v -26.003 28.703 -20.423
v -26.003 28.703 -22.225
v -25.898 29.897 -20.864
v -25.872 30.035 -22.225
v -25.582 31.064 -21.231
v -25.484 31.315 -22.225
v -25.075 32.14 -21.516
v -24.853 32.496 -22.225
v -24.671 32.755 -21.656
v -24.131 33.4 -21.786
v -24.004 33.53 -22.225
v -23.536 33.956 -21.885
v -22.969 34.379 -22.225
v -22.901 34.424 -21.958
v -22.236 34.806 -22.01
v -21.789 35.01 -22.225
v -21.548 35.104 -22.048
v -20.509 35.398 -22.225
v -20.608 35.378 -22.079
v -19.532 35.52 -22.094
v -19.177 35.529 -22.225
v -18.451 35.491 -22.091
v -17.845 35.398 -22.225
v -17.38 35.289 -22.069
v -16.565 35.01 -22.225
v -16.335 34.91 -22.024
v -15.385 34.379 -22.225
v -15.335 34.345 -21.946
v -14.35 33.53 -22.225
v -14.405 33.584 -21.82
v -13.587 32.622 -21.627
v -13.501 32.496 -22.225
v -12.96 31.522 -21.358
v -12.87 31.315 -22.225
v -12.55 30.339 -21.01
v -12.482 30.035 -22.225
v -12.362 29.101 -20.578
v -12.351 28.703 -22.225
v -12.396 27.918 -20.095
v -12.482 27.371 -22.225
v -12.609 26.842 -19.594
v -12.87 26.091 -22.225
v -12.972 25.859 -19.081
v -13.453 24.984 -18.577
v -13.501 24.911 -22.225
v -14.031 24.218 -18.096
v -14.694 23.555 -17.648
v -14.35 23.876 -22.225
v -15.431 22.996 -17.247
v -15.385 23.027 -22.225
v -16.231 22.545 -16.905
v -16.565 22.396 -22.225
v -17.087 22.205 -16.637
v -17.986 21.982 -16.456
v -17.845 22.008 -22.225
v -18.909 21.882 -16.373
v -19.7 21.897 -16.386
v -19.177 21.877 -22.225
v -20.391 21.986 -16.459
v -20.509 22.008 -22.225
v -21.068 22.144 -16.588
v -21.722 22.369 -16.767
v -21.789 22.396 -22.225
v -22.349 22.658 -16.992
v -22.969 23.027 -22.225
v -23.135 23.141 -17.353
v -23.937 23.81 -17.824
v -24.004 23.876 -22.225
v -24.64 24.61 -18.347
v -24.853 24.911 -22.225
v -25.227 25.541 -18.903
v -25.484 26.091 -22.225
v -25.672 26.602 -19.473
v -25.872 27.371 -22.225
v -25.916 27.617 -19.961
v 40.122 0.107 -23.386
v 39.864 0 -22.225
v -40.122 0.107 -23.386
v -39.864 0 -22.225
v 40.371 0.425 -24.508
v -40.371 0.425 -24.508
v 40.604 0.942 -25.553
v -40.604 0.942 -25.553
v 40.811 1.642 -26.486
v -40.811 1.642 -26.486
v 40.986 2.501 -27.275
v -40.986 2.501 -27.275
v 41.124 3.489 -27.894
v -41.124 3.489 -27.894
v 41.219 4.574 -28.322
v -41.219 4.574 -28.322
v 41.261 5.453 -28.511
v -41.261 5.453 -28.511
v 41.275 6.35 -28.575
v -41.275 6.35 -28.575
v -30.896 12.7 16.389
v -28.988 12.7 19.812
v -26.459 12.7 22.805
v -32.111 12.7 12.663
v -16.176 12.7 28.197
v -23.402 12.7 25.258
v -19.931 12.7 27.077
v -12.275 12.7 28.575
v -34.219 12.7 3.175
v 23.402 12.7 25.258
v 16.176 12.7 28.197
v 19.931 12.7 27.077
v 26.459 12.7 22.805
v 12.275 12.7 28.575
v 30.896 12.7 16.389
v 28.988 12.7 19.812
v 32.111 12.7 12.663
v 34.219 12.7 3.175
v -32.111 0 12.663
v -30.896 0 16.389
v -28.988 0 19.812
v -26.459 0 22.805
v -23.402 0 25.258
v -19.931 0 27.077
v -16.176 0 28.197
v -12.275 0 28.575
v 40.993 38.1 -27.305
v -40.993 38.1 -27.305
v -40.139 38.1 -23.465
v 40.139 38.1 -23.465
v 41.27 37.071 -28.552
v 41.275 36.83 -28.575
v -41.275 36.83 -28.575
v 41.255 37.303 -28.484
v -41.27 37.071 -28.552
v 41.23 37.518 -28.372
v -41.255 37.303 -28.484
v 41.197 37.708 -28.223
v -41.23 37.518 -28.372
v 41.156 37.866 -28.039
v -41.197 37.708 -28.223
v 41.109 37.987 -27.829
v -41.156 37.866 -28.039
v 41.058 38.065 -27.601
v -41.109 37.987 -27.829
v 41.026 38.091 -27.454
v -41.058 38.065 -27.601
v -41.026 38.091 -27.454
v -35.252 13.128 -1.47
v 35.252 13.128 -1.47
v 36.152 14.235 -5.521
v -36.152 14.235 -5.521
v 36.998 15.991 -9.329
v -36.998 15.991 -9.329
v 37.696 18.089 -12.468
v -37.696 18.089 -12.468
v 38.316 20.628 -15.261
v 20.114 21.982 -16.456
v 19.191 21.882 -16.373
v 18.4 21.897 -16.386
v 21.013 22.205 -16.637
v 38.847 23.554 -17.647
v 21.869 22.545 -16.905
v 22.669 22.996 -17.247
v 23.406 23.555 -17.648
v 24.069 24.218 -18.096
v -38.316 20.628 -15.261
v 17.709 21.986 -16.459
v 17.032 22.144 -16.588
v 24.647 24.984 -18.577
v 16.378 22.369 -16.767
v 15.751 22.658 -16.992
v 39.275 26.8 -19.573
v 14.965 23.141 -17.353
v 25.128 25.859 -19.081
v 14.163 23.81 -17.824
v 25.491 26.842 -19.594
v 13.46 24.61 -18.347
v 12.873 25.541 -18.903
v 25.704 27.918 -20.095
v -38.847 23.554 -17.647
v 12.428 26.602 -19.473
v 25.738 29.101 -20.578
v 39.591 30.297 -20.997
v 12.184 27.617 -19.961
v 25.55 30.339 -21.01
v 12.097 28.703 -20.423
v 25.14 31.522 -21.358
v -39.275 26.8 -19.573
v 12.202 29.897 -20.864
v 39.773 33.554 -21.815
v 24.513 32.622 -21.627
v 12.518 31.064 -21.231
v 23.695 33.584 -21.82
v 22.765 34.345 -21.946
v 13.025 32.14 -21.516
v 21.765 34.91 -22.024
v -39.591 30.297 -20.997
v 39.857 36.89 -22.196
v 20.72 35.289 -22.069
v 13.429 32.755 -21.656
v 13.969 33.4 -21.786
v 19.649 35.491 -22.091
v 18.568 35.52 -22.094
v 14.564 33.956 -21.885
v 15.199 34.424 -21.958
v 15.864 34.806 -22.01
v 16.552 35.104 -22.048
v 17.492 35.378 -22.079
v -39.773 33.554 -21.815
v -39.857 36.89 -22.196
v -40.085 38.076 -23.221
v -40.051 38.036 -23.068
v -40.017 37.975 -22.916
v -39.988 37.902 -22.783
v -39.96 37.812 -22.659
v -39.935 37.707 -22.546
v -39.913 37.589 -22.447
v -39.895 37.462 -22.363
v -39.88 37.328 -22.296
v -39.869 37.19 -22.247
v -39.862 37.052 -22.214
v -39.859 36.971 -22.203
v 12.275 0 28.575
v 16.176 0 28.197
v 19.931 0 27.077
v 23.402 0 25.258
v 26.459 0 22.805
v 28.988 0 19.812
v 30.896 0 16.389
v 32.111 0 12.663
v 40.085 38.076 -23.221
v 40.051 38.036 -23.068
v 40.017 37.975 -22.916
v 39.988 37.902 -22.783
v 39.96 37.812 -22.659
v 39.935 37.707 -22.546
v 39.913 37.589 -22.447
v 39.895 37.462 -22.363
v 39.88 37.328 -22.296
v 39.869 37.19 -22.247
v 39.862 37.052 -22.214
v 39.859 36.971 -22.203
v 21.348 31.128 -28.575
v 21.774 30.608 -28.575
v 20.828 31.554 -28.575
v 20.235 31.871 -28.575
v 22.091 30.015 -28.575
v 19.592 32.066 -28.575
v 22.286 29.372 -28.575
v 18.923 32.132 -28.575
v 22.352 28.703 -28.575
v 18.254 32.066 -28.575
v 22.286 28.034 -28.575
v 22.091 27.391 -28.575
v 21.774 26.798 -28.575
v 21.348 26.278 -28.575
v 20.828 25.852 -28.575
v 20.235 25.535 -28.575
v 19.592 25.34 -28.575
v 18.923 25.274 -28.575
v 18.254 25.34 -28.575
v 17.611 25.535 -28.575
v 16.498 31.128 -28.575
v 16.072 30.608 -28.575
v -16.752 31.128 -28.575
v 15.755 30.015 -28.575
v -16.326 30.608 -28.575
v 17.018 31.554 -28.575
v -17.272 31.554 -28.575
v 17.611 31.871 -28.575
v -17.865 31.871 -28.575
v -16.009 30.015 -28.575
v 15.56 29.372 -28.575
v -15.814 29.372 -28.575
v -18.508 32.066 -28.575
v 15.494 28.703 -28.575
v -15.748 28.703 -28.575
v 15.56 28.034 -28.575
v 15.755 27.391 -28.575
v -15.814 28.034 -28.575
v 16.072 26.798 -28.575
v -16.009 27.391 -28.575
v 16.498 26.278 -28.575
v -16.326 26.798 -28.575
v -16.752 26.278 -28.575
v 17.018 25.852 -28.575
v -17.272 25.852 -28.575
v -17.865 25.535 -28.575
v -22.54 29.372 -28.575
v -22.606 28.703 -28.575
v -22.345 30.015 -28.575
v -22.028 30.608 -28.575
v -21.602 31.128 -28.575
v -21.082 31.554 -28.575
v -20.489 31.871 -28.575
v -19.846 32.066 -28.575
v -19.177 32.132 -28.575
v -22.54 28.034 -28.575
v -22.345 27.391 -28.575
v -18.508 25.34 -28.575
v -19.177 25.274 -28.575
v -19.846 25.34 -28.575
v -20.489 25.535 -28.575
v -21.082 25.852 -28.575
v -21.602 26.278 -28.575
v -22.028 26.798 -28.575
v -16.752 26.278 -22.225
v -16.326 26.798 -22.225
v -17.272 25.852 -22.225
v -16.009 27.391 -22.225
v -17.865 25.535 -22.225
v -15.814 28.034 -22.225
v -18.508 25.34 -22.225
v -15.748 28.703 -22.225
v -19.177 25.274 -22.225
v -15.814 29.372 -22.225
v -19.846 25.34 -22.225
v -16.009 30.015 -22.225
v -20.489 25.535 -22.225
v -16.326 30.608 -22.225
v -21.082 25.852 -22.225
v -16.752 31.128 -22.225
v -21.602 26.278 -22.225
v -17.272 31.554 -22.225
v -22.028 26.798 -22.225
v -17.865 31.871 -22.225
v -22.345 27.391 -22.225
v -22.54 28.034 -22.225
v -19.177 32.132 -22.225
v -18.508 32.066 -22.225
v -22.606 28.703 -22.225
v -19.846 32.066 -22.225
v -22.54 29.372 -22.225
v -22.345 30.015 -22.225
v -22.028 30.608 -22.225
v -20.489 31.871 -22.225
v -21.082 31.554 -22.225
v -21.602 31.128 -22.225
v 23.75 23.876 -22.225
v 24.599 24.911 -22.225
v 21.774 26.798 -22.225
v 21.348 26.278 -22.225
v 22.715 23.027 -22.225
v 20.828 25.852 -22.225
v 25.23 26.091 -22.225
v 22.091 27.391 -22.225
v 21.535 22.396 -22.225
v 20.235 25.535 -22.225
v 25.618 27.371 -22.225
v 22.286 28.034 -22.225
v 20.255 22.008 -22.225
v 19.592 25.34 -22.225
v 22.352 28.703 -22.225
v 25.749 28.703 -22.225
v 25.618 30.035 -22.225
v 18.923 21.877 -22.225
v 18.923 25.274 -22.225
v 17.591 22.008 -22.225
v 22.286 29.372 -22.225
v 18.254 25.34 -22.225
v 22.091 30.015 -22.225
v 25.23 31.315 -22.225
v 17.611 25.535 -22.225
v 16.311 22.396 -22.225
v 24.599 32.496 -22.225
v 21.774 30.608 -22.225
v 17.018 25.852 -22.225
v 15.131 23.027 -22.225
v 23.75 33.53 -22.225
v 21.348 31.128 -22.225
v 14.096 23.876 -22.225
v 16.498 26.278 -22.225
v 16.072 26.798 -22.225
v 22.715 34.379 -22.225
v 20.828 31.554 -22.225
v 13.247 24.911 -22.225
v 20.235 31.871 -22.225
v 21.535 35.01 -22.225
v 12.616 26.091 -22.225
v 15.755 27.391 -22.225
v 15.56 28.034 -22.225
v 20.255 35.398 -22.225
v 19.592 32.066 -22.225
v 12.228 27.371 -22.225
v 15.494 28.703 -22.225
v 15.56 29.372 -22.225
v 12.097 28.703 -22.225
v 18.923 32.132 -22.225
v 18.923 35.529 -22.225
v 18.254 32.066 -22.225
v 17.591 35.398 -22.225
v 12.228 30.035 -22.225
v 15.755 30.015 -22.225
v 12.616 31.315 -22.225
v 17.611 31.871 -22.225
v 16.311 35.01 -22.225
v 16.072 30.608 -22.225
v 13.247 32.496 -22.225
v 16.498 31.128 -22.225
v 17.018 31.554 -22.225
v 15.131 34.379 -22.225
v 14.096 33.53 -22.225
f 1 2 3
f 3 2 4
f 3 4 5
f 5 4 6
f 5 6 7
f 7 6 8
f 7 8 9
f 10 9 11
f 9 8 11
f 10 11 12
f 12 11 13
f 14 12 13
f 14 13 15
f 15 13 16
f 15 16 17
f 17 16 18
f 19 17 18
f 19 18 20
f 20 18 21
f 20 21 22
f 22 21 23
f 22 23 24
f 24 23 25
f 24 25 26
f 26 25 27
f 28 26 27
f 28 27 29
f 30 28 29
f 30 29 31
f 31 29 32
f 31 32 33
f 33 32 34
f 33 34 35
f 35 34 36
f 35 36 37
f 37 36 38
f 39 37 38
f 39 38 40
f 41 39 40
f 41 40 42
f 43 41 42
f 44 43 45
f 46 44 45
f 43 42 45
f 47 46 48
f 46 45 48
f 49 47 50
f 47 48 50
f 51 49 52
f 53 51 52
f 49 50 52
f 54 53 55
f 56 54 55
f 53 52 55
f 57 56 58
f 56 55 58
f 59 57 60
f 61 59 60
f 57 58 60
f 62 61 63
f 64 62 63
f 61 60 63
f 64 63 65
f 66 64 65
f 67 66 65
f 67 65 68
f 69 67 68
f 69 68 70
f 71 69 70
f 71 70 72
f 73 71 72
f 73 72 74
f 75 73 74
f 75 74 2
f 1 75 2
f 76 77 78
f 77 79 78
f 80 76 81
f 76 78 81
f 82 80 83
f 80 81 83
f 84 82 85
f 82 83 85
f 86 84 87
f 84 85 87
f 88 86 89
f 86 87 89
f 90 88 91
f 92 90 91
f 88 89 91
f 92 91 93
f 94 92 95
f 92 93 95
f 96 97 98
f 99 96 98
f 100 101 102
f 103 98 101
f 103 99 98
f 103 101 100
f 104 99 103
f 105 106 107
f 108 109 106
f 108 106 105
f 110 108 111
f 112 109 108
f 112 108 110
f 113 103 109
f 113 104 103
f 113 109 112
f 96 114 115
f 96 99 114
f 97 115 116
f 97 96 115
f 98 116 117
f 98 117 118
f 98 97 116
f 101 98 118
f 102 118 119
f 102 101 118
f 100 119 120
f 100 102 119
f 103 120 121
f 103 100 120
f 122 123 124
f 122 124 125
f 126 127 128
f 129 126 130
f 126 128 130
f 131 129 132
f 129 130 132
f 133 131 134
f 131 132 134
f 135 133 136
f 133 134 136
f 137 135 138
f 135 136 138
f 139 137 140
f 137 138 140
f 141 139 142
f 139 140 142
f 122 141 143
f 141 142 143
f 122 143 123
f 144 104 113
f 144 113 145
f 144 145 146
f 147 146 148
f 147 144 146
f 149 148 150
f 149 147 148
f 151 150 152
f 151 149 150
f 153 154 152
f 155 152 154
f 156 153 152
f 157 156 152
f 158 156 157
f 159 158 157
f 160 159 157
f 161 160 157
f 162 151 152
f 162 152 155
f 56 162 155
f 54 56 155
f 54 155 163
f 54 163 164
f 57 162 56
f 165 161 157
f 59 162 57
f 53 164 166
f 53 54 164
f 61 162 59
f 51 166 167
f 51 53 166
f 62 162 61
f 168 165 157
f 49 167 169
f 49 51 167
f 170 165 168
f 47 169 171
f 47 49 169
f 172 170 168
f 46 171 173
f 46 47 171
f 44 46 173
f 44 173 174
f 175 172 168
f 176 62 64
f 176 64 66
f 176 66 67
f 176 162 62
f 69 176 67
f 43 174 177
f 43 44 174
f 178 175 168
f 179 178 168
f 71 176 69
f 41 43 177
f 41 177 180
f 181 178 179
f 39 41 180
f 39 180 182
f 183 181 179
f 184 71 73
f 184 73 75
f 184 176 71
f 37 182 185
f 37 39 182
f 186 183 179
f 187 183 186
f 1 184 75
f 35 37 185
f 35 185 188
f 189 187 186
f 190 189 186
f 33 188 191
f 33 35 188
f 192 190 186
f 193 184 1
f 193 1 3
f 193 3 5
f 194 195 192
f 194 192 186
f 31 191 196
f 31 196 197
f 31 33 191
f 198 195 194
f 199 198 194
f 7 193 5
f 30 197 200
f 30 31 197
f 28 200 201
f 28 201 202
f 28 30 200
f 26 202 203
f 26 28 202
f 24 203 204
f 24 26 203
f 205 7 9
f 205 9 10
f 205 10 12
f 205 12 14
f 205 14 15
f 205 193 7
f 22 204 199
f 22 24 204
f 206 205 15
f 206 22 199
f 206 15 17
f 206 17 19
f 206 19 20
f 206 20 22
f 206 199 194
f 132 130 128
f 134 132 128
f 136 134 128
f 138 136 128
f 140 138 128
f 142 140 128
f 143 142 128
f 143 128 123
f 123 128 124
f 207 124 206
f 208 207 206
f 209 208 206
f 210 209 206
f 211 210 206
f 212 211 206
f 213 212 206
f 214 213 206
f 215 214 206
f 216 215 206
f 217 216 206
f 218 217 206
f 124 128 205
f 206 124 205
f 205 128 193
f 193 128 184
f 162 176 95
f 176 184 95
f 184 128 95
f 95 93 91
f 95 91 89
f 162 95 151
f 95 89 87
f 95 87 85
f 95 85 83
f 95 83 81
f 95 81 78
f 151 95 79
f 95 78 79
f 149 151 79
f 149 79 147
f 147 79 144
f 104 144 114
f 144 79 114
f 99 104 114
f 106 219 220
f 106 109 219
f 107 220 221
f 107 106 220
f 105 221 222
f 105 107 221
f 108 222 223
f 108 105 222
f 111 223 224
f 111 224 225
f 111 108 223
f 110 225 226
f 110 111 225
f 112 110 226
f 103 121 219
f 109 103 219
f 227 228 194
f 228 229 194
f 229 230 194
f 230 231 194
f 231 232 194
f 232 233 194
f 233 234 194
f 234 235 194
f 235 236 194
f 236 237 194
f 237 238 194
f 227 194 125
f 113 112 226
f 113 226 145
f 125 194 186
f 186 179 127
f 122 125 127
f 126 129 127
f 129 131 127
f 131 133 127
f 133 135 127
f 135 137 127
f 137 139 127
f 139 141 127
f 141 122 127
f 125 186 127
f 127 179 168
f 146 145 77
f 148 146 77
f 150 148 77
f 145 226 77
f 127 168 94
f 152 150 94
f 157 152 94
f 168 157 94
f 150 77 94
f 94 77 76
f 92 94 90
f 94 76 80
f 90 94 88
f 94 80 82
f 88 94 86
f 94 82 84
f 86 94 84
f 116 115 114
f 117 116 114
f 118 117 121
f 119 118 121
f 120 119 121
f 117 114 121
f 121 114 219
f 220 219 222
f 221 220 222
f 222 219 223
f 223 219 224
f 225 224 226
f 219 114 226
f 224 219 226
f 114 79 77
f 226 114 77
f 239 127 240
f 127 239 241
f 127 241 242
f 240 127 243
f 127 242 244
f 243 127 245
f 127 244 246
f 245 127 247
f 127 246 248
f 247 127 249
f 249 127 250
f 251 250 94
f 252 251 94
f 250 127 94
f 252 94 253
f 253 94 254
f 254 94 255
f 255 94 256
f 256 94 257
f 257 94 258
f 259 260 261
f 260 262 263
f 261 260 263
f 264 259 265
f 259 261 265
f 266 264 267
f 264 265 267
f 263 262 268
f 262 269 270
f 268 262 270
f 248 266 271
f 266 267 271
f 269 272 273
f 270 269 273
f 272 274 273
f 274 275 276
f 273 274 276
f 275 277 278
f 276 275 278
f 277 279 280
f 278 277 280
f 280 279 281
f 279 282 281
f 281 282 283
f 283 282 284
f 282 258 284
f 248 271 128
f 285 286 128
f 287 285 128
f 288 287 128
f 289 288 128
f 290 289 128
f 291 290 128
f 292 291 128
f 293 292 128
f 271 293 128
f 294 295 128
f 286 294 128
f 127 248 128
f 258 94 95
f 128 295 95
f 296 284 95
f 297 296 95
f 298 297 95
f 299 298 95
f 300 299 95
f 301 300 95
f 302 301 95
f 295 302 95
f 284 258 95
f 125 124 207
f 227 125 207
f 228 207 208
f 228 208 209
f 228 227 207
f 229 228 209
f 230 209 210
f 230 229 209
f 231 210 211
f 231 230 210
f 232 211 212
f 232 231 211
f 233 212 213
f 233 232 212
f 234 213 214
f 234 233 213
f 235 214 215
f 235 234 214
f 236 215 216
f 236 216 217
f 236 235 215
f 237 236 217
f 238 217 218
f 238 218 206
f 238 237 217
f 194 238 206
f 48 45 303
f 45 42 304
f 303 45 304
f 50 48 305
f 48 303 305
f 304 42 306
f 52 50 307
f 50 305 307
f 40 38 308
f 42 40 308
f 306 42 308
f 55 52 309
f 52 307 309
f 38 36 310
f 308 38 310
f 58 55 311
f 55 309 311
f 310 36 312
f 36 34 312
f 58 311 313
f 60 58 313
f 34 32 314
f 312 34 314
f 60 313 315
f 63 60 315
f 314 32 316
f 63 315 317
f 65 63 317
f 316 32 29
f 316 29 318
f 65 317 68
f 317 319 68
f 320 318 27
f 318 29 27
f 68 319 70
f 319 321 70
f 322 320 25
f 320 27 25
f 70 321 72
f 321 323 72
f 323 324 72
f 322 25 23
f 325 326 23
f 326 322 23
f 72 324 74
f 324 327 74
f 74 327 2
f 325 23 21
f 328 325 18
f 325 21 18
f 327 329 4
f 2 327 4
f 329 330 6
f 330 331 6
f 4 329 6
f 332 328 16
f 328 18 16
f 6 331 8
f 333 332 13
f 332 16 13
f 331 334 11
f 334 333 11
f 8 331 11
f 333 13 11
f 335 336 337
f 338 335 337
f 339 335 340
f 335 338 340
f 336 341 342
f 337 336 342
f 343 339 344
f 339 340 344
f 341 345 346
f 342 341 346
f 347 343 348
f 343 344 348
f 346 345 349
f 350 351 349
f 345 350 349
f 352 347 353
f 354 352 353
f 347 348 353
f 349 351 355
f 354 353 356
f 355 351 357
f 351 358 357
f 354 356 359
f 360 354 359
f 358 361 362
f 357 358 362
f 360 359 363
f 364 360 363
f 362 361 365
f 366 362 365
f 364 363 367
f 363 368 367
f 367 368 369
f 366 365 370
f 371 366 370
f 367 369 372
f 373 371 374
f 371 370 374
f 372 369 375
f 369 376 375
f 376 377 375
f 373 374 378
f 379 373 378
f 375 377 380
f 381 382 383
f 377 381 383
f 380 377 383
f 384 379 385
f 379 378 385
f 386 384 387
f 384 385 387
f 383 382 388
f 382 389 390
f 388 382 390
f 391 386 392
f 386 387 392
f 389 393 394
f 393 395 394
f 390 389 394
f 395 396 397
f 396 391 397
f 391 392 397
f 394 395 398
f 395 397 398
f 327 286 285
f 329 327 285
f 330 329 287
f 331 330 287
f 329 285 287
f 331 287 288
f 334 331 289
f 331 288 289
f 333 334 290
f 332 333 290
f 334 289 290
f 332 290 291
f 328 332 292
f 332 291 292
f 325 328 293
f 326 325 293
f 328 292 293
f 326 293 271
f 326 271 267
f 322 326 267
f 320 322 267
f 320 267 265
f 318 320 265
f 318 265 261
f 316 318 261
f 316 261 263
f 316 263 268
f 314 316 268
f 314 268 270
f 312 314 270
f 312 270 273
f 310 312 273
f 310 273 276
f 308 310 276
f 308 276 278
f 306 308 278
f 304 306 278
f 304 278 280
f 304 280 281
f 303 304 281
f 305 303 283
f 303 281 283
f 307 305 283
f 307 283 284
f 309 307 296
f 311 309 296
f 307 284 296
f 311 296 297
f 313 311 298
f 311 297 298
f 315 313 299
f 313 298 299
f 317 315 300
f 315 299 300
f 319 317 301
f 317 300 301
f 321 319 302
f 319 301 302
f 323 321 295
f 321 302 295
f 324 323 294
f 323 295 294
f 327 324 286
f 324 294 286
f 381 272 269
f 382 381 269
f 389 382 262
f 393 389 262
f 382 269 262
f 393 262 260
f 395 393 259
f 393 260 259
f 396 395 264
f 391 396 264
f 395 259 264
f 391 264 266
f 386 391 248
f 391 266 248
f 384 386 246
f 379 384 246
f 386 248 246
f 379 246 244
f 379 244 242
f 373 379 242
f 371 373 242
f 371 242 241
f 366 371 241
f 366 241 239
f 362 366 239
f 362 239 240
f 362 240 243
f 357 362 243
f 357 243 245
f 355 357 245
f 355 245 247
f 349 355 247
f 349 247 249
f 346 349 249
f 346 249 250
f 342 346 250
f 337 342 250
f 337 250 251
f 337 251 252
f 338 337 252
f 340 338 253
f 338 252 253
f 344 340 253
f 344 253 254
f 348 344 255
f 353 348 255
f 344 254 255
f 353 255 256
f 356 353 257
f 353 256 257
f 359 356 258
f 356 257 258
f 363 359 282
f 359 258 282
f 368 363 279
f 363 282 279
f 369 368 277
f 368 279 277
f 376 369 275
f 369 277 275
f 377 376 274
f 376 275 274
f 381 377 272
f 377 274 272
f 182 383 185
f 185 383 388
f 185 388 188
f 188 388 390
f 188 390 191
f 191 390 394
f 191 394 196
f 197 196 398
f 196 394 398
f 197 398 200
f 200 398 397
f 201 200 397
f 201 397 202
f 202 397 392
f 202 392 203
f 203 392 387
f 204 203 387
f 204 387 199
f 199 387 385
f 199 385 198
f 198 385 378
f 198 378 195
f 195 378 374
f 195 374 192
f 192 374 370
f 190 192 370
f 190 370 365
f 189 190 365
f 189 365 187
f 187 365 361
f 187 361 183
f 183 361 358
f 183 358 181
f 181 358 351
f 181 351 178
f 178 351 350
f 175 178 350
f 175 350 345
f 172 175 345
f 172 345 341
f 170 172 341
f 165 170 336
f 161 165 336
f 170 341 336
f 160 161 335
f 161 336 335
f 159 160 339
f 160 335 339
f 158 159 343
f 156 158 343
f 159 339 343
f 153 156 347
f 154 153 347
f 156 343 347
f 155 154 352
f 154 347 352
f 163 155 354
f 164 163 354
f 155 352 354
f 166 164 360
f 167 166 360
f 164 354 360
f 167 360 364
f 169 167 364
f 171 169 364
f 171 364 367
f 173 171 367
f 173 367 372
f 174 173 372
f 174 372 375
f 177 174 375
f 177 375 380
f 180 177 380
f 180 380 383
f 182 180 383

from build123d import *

# Parameters (mm, degrees)
BOSS_EXTRUDE1_DEPTH = 12.7
BOSS_EXTRUDE2_DEPTH = 38.1
FILLET1_R           = 25.4
FILLET2_R           = 20.32
FILLET3_R           = 6.35
FILLET4_R           = 1.2699999999999994
CUT_EXTRUDE1_DEPTH  = 38.1
SKETCH5_R           = 6.826249999999999
SKETCH5_R_2         = 6.826250000000001
CUT_EXTRUDE4_DEPTH  = 20.32


with BuildPart() as part:
    # Sketch1 → Boss-Extrude1 (new body)
    with BuildSketch(Plane(origin=(0, 0, 0), x_dir=(1, 0, 0), z_dir=(0, 1, 0))):
        Polygon((39.86388888888888, 22.225000000000012), (-39.86388888888888, 22.225), (-28.574999999999996, -28.57499999999998), (28.575000000000006, -28.574999999999978), align=None)
        Polygon((41.27499999999999, 28.575000000000014), (-41.275000000000006, 28.575000000000003), (-39.863888888888894, 22.225), (39.86388888888888, 22.225000000000012), align=None)
    extrude(amount=BOSS_EXTRUDE1_DEPTH)

    # Sketch1<5> → Boss-Extrude2 (add)
    with BuildSketch(Plane(origin=(0, 0, 0), x_dir=(1, 0, 0), z_dir=(0, 1, 0))):
        Polygon((41.27499999999999, 28.575000000000014), (-41.275000000000006, 28.575000000000003), (-39.863888888888894, 22.225), (39.86388888888888, 22.225000000000012), align=None)
    extrude(amount=BOSS_EXTRUDE2_DEPTH)

    # Fillet1
    fillet1_edges = [part.edges().sort_by_distance(p)[0] for p in [
        (0, 12.7, -22.22500000000001),
    ]]
    fillet(fillet1_edges, radius=FILLET1_R - 0.0001)  # a hair under: the kernel refuses the full size

    # Fillet2
    fillet2_edges = [part.edges().sort_by_distance(p)[0] for p in [
        (28.575000000000006, 6.35, 28.574999999999978),
        (-28.574999999999996, 6.35, 28.57499999999998),
    ]]
    fillet(fillet2_edges, radius=FILLET2_R)

    # Fillet3
    fillet3_edges = [part.edges().sort_by_distance(p)[0] for p in [
        (-7.11e-15, 0, -28.57500000000001),
    ]]
    fillet(fillet3_edges, radius=FILLET3_R)

    # Fillet4
    fillet4_edges = [part.edges().sort_by_distance(p)[0] for p in [
        (0, 38.1, -22.22500000000001),
        (-7.11e-15, 38.1, -28.57500000000001),
    ]]
    fillet(fillet4_edges, radius=FILLET4_R)

    # Sketch4 → Cut-Extrude1 (cut)
    with BuildSketch(Plane(origin=(-3.6e-15, 0, -28.57500000000001), x_dir=(-1, 0, 1.3e-16), z_dir=(-1.3e-16, 0, -1))):
        with BuildLine():
            ThreePointArc((-22.35199999999955, 28.703096211960737), (-18.92299999999955, 25.27409621196074), (-15.493999999999552, 28.703096211960737))
            Line((-15.493999999999552, 28.70309621196053), (-22.35199999999955, 28.70309621196053))
        make_face()
        with BuildLine():
            Line((-22.35199999999955, 28.70309621196053), (-15.493999999999552, 28.70309621196053))
            ThreePointArc((-15.493999999999552, 28.703096211960737), (-18.92299999999955, 32.132096211960736), (-22.35199999999955, 28.703096211960737))
        make_face()
        with BuildLine():
            ThreePointArc((15.748000000000676, 28.70309621196054), (19.177000000000678, 25.274096211960536), (22.60600000000068, 28.70309621196054))
            Line((22.60600000000068, 28.703096211960535), (15.748000000000676, 28.703096211960535))
        make_face()
        with BuildLine():
            Line((15.748000000000676, 28.703096211960535), (22.60600000000068, 28.703096211960535))
            ThreePointArc((22.60600000000068, 28.70309621196054), (19.177000000000678, 32.132096211960544), (15.748000000000676, 28.70309621196054))
        make_face()
    extrude(amount=-CUT_EXTRUDE1_DEPTH, mode=Mode.SUBTRACT)

    # Sketch5 → Cut-Extrude4 (cut)
    with BuildSketch(Plane(origin=(-2.8e-15, 0, -22.22500000000001), x_dir=(-1, 0, 1.3e-16), z_dir=(-1.3e-16, 0, -1))):
        with Locations((-18.92299999999955, 28.703096211960737)):
            Circle(SKETCH5_R)
        with Locations((19.177000000000678, 28.70309621196054)):
            Circle(SKETCH5_R_2)
    extrude(amount=-CUT_EXTRUDE4_DEPTH, mode=Mode.SUBTRACT)


solid = part.part
